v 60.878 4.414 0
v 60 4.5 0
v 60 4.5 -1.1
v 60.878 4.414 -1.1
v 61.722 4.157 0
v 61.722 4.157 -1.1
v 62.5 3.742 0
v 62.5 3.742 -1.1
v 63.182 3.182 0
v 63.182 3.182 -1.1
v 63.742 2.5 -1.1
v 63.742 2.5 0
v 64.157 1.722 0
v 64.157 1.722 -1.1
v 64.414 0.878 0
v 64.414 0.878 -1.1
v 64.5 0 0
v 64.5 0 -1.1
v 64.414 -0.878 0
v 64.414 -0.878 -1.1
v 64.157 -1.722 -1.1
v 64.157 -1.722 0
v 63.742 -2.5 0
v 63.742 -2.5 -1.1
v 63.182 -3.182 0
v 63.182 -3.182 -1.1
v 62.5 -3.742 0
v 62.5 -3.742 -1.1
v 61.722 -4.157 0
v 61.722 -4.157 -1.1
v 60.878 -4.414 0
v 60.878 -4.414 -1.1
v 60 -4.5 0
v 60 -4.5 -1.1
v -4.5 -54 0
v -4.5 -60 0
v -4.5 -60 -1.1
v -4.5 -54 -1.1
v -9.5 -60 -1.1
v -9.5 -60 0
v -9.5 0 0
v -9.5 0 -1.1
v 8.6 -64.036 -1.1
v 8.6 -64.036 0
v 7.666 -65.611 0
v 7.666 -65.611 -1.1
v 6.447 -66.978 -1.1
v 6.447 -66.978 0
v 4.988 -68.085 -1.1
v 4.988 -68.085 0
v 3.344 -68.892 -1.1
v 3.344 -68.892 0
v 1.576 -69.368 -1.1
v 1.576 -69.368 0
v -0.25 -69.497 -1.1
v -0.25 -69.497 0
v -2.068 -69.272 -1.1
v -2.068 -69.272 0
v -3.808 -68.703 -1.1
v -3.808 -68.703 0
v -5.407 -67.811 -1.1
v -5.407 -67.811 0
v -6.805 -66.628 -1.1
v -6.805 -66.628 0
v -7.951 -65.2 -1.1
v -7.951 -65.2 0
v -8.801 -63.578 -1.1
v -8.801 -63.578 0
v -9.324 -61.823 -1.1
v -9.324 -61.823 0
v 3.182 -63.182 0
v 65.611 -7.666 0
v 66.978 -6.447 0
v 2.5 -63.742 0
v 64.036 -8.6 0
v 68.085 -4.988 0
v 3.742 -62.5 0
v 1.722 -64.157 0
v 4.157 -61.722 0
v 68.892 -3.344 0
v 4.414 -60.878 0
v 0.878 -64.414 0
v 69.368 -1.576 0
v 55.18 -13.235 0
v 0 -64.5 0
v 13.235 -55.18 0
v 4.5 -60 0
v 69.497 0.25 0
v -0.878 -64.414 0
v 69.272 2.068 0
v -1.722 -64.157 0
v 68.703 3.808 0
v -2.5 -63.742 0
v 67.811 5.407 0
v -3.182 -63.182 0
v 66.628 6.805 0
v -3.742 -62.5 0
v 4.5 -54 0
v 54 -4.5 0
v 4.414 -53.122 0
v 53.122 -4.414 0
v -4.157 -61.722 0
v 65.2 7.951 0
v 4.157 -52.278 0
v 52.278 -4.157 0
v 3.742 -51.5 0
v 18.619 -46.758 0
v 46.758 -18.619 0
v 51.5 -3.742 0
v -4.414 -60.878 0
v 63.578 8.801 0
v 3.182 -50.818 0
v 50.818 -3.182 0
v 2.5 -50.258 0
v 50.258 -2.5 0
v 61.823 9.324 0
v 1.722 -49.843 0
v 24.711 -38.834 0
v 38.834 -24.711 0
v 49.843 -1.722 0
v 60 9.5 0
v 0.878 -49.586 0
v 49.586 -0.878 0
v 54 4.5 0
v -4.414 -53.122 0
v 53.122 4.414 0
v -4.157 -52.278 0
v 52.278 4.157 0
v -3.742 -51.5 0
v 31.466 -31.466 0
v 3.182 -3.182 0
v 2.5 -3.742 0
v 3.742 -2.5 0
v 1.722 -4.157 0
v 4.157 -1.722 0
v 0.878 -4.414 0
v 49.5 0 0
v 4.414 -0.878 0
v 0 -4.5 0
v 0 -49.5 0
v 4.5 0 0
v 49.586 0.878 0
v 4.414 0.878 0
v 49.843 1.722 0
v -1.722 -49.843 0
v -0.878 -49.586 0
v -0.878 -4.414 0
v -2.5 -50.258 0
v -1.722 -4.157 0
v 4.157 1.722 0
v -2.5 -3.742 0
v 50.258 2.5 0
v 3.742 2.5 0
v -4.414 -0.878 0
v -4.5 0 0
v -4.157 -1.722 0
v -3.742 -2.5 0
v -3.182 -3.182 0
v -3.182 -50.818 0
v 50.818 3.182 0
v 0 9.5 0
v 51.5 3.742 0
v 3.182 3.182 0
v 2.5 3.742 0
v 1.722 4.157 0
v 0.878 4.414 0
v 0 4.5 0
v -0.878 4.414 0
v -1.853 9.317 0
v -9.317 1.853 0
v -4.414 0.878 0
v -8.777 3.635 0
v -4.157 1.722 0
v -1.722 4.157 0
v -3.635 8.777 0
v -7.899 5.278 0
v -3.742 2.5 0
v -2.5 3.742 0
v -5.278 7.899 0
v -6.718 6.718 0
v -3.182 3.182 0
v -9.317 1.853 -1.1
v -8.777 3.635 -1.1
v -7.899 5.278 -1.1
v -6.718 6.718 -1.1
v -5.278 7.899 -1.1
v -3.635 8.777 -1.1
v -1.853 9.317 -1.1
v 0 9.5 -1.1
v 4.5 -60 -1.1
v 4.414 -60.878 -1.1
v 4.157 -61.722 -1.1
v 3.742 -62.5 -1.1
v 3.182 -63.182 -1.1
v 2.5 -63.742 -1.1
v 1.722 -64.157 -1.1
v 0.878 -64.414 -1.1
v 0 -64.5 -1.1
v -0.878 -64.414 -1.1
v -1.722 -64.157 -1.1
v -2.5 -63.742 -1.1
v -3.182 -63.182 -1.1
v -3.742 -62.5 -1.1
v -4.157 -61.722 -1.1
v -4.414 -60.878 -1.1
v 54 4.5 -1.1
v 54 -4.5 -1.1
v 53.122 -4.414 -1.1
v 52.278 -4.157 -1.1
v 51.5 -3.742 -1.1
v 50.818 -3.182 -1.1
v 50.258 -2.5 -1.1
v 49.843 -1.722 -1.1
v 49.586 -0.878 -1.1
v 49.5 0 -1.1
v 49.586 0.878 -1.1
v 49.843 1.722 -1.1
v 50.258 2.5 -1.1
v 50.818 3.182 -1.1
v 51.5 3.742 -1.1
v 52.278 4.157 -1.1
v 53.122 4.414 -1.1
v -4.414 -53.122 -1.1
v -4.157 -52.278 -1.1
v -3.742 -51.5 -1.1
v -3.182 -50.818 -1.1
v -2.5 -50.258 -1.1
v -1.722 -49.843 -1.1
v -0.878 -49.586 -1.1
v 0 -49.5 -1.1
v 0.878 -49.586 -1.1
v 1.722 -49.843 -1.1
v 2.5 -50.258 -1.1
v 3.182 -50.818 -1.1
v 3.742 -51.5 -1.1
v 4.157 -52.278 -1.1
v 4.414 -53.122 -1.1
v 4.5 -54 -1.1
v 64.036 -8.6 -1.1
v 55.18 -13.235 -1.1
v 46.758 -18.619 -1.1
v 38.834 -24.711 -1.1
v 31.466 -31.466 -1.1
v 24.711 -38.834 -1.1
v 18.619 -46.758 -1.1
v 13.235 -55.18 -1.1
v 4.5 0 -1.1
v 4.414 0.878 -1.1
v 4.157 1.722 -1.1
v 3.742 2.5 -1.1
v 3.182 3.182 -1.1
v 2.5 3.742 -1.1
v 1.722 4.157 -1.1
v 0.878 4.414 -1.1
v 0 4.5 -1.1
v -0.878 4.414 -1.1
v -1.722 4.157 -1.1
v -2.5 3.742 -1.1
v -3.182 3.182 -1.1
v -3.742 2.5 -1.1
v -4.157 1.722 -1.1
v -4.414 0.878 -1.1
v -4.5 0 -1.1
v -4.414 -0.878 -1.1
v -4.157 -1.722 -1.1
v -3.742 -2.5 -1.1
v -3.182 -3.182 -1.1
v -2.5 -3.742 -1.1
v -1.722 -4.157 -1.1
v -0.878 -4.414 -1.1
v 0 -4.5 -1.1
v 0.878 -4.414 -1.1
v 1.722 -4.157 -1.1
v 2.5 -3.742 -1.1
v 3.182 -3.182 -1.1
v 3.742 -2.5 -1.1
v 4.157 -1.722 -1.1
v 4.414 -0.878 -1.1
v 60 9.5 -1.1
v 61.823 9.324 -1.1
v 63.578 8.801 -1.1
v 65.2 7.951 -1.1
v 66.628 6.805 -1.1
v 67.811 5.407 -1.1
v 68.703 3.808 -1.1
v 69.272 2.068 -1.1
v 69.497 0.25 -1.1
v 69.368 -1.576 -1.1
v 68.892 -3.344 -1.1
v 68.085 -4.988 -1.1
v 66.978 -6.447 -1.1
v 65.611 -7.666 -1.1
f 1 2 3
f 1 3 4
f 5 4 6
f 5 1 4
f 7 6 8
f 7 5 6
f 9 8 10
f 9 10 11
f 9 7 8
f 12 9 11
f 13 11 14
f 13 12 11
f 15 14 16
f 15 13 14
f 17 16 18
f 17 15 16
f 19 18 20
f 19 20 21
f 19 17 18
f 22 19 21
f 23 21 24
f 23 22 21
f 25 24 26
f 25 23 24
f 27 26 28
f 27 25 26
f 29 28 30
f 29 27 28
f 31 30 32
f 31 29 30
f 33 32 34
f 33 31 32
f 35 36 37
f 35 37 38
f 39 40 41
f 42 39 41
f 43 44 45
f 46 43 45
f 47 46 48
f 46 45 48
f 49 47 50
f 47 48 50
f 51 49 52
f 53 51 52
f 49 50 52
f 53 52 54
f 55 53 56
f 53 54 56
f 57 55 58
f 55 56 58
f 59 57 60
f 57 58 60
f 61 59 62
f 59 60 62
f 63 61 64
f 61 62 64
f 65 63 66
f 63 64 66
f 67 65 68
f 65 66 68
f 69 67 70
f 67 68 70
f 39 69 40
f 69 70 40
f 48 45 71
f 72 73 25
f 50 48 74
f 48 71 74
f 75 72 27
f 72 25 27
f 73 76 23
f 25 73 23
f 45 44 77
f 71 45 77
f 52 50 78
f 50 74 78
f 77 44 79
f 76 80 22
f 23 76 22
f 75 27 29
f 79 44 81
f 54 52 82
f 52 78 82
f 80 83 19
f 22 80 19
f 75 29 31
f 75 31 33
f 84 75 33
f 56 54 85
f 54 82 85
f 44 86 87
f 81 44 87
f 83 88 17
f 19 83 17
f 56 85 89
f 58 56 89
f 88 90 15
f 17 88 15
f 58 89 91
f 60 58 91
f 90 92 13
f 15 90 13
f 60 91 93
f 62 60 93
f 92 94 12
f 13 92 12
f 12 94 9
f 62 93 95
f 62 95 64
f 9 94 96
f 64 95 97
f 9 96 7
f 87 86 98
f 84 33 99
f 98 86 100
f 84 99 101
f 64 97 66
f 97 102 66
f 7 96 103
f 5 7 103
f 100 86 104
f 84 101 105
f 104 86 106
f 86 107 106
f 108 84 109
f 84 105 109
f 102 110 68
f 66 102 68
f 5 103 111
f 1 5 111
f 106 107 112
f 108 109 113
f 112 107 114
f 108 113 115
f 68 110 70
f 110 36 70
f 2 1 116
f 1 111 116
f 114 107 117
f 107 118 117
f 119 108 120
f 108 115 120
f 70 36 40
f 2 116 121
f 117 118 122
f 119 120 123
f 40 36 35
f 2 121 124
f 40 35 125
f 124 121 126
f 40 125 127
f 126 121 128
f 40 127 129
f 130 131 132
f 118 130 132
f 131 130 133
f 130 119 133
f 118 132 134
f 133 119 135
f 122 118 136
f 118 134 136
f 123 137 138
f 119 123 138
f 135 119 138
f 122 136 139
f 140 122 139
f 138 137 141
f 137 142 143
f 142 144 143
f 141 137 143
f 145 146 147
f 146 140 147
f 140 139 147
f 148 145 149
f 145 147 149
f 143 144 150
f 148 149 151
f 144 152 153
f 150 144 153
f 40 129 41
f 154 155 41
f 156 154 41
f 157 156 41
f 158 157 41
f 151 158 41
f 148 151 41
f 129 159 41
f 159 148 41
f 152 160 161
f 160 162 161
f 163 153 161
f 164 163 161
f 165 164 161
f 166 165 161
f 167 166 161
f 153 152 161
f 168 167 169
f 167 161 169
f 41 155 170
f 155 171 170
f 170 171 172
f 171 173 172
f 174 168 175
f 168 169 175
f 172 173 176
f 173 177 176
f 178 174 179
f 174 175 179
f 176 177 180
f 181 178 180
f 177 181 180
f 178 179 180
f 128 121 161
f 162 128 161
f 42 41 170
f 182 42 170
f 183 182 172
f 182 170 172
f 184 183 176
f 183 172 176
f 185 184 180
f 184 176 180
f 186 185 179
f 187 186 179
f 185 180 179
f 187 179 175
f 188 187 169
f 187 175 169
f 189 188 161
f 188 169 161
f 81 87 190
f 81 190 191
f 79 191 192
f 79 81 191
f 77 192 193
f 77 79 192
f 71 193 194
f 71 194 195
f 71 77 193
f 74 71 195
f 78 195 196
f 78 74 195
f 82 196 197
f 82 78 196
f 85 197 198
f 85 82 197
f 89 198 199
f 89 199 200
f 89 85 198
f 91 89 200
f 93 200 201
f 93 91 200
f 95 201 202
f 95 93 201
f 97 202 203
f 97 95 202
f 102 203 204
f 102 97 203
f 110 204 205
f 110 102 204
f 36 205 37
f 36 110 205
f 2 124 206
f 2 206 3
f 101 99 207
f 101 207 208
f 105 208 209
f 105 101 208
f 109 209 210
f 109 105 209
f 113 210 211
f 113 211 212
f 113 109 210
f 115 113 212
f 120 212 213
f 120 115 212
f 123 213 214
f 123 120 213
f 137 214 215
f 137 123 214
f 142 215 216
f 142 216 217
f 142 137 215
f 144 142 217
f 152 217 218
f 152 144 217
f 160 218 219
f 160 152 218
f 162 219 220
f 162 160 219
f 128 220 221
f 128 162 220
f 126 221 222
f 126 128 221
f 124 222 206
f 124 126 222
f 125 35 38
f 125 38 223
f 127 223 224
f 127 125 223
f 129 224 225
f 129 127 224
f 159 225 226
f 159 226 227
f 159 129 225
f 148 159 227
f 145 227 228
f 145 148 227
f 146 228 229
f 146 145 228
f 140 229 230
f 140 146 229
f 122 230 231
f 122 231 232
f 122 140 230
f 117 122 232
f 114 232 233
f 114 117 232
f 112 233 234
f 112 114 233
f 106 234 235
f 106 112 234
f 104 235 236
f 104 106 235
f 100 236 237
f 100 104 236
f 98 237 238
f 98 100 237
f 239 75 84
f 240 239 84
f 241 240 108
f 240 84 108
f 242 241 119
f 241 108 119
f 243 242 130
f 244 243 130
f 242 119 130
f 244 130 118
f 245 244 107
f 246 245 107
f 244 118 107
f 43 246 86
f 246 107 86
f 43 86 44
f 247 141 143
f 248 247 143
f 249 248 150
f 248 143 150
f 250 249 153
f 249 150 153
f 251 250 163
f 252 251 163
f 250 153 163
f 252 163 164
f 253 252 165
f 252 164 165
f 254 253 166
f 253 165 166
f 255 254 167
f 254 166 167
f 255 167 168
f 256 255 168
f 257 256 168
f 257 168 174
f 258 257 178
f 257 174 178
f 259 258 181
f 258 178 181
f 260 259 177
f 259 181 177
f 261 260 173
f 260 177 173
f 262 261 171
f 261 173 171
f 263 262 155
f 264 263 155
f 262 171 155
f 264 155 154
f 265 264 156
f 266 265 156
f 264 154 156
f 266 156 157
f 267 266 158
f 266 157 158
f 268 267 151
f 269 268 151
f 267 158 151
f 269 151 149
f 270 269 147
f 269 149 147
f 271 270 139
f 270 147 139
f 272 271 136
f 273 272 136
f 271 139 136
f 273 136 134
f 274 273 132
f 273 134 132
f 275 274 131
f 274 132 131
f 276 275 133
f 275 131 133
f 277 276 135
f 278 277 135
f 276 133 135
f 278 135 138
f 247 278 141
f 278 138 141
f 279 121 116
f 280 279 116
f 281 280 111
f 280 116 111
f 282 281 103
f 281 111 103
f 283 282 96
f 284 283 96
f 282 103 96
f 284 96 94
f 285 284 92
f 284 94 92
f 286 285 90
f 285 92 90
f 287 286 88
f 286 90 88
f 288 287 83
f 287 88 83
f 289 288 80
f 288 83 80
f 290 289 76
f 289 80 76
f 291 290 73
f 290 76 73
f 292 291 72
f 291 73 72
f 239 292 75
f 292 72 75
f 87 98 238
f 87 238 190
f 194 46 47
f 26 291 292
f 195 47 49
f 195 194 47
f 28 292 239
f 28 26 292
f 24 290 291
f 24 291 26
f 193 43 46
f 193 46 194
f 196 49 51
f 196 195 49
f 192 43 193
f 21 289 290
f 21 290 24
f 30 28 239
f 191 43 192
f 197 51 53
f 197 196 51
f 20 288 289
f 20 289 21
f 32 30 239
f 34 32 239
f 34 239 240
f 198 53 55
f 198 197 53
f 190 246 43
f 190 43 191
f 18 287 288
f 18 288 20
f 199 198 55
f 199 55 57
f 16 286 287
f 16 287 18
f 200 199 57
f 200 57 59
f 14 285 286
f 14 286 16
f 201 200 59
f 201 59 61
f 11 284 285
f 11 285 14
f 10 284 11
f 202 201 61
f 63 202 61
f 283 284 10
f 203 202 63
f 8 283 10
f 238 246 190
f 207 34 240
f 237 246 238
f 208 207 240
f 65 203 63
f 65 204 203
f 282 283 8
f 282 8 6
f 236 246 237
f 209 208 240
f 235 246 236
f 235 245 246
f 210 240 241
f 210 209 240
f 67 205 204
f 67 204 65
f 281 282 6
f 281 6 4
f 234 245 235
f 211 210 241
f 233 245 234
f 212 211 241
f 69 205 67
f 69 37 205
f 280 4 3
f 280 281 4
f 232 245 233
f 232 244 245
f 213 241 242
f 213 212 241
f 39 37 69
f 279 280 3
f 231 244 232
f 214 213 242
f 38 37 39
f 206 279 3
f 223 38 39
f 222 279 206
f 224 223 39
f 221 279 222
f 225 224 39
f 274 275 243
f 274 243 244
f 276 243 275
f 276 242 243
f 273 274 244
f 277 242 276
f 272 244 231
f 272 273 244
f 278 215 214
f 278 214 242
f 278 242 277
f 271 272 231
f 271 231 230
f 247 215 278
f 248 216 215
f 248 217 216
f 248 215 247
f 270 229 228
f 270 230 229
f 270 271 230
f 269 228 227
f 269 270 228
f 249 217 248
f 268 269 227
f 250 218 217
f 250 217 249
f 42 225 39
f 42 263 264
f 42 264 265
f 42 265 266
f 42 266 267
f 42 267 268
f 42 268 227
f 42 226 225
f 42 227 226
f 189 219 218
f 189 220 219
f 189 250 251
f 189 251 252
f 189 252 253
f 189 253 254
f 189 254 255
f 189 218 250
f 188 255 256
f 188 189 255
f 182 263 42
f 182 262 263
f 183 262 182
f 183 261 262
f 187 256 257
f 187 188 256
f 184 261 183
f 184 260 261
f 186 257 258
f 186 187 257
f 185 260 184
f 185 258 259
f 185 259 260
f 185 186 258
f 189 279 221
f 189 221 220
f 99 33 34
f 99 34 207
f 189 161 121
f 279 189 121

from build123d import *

# Parameters (mm, degrees)
SKETCH1_R           = 4.5
BOSS_EXTRUDE1_DEPTH = 1.1


with BuildPart() as part:
    # Sketch1 → Boss-Extrude1 (new body)
    with BuildSketch(Plane.XY):
        with BuildLine():
            Line((-9.5, -60), (-9.5, 0))
            ThreePointArc((-9.5, 0), (-6.717514421, 6.717514421), (0, 9.5))
            Line((0, 9.5), (60, 9.5))
            ThreePointArc((60, 9.5), (69.272242002, 2.067735054), (64.036324171, -8.599888789))
            ThreePointArc((64.036324171, -8.599888789), (31.466251763, -31.466251763), (8.599888789, -64.036324171))
            ThreePointArc((8.599888789, -64.036324171), (-2.067735054, -69.272242002), (-9.5, -60))
        make_face()
        Circle(SKETCH1_R, mode=Mode.SUBTRACT)
        with BuildLine():
            Line((-4.5, -60), (-4.5, -54))
            ThreePointArc((-4.5, -54), (0, -49.5), (4.5, -54))
            Line((4.5, -54), (4.5, -60))
            ThreePointArc((4.5, -60), (0, -64.5), (-4.5, -60))
        make_face(mode=Mode.SUBTRACT)
        with BuildLine():
            Line((60, -4.5), (54, -4.5))
            ThreePointArc((54, -4.5), (49.5, 0), (54, 4.5))
            Line((54, 4.5), (60, 4.5))
            ThreePointArc((60, 4.5), (64.5, 0), (60, -4.5))
        make_face(mode=Mode.SUBTRACT)
    extrude(amount=-BOSS_EXTRUDE1_DEPTH)


solid = part.part
